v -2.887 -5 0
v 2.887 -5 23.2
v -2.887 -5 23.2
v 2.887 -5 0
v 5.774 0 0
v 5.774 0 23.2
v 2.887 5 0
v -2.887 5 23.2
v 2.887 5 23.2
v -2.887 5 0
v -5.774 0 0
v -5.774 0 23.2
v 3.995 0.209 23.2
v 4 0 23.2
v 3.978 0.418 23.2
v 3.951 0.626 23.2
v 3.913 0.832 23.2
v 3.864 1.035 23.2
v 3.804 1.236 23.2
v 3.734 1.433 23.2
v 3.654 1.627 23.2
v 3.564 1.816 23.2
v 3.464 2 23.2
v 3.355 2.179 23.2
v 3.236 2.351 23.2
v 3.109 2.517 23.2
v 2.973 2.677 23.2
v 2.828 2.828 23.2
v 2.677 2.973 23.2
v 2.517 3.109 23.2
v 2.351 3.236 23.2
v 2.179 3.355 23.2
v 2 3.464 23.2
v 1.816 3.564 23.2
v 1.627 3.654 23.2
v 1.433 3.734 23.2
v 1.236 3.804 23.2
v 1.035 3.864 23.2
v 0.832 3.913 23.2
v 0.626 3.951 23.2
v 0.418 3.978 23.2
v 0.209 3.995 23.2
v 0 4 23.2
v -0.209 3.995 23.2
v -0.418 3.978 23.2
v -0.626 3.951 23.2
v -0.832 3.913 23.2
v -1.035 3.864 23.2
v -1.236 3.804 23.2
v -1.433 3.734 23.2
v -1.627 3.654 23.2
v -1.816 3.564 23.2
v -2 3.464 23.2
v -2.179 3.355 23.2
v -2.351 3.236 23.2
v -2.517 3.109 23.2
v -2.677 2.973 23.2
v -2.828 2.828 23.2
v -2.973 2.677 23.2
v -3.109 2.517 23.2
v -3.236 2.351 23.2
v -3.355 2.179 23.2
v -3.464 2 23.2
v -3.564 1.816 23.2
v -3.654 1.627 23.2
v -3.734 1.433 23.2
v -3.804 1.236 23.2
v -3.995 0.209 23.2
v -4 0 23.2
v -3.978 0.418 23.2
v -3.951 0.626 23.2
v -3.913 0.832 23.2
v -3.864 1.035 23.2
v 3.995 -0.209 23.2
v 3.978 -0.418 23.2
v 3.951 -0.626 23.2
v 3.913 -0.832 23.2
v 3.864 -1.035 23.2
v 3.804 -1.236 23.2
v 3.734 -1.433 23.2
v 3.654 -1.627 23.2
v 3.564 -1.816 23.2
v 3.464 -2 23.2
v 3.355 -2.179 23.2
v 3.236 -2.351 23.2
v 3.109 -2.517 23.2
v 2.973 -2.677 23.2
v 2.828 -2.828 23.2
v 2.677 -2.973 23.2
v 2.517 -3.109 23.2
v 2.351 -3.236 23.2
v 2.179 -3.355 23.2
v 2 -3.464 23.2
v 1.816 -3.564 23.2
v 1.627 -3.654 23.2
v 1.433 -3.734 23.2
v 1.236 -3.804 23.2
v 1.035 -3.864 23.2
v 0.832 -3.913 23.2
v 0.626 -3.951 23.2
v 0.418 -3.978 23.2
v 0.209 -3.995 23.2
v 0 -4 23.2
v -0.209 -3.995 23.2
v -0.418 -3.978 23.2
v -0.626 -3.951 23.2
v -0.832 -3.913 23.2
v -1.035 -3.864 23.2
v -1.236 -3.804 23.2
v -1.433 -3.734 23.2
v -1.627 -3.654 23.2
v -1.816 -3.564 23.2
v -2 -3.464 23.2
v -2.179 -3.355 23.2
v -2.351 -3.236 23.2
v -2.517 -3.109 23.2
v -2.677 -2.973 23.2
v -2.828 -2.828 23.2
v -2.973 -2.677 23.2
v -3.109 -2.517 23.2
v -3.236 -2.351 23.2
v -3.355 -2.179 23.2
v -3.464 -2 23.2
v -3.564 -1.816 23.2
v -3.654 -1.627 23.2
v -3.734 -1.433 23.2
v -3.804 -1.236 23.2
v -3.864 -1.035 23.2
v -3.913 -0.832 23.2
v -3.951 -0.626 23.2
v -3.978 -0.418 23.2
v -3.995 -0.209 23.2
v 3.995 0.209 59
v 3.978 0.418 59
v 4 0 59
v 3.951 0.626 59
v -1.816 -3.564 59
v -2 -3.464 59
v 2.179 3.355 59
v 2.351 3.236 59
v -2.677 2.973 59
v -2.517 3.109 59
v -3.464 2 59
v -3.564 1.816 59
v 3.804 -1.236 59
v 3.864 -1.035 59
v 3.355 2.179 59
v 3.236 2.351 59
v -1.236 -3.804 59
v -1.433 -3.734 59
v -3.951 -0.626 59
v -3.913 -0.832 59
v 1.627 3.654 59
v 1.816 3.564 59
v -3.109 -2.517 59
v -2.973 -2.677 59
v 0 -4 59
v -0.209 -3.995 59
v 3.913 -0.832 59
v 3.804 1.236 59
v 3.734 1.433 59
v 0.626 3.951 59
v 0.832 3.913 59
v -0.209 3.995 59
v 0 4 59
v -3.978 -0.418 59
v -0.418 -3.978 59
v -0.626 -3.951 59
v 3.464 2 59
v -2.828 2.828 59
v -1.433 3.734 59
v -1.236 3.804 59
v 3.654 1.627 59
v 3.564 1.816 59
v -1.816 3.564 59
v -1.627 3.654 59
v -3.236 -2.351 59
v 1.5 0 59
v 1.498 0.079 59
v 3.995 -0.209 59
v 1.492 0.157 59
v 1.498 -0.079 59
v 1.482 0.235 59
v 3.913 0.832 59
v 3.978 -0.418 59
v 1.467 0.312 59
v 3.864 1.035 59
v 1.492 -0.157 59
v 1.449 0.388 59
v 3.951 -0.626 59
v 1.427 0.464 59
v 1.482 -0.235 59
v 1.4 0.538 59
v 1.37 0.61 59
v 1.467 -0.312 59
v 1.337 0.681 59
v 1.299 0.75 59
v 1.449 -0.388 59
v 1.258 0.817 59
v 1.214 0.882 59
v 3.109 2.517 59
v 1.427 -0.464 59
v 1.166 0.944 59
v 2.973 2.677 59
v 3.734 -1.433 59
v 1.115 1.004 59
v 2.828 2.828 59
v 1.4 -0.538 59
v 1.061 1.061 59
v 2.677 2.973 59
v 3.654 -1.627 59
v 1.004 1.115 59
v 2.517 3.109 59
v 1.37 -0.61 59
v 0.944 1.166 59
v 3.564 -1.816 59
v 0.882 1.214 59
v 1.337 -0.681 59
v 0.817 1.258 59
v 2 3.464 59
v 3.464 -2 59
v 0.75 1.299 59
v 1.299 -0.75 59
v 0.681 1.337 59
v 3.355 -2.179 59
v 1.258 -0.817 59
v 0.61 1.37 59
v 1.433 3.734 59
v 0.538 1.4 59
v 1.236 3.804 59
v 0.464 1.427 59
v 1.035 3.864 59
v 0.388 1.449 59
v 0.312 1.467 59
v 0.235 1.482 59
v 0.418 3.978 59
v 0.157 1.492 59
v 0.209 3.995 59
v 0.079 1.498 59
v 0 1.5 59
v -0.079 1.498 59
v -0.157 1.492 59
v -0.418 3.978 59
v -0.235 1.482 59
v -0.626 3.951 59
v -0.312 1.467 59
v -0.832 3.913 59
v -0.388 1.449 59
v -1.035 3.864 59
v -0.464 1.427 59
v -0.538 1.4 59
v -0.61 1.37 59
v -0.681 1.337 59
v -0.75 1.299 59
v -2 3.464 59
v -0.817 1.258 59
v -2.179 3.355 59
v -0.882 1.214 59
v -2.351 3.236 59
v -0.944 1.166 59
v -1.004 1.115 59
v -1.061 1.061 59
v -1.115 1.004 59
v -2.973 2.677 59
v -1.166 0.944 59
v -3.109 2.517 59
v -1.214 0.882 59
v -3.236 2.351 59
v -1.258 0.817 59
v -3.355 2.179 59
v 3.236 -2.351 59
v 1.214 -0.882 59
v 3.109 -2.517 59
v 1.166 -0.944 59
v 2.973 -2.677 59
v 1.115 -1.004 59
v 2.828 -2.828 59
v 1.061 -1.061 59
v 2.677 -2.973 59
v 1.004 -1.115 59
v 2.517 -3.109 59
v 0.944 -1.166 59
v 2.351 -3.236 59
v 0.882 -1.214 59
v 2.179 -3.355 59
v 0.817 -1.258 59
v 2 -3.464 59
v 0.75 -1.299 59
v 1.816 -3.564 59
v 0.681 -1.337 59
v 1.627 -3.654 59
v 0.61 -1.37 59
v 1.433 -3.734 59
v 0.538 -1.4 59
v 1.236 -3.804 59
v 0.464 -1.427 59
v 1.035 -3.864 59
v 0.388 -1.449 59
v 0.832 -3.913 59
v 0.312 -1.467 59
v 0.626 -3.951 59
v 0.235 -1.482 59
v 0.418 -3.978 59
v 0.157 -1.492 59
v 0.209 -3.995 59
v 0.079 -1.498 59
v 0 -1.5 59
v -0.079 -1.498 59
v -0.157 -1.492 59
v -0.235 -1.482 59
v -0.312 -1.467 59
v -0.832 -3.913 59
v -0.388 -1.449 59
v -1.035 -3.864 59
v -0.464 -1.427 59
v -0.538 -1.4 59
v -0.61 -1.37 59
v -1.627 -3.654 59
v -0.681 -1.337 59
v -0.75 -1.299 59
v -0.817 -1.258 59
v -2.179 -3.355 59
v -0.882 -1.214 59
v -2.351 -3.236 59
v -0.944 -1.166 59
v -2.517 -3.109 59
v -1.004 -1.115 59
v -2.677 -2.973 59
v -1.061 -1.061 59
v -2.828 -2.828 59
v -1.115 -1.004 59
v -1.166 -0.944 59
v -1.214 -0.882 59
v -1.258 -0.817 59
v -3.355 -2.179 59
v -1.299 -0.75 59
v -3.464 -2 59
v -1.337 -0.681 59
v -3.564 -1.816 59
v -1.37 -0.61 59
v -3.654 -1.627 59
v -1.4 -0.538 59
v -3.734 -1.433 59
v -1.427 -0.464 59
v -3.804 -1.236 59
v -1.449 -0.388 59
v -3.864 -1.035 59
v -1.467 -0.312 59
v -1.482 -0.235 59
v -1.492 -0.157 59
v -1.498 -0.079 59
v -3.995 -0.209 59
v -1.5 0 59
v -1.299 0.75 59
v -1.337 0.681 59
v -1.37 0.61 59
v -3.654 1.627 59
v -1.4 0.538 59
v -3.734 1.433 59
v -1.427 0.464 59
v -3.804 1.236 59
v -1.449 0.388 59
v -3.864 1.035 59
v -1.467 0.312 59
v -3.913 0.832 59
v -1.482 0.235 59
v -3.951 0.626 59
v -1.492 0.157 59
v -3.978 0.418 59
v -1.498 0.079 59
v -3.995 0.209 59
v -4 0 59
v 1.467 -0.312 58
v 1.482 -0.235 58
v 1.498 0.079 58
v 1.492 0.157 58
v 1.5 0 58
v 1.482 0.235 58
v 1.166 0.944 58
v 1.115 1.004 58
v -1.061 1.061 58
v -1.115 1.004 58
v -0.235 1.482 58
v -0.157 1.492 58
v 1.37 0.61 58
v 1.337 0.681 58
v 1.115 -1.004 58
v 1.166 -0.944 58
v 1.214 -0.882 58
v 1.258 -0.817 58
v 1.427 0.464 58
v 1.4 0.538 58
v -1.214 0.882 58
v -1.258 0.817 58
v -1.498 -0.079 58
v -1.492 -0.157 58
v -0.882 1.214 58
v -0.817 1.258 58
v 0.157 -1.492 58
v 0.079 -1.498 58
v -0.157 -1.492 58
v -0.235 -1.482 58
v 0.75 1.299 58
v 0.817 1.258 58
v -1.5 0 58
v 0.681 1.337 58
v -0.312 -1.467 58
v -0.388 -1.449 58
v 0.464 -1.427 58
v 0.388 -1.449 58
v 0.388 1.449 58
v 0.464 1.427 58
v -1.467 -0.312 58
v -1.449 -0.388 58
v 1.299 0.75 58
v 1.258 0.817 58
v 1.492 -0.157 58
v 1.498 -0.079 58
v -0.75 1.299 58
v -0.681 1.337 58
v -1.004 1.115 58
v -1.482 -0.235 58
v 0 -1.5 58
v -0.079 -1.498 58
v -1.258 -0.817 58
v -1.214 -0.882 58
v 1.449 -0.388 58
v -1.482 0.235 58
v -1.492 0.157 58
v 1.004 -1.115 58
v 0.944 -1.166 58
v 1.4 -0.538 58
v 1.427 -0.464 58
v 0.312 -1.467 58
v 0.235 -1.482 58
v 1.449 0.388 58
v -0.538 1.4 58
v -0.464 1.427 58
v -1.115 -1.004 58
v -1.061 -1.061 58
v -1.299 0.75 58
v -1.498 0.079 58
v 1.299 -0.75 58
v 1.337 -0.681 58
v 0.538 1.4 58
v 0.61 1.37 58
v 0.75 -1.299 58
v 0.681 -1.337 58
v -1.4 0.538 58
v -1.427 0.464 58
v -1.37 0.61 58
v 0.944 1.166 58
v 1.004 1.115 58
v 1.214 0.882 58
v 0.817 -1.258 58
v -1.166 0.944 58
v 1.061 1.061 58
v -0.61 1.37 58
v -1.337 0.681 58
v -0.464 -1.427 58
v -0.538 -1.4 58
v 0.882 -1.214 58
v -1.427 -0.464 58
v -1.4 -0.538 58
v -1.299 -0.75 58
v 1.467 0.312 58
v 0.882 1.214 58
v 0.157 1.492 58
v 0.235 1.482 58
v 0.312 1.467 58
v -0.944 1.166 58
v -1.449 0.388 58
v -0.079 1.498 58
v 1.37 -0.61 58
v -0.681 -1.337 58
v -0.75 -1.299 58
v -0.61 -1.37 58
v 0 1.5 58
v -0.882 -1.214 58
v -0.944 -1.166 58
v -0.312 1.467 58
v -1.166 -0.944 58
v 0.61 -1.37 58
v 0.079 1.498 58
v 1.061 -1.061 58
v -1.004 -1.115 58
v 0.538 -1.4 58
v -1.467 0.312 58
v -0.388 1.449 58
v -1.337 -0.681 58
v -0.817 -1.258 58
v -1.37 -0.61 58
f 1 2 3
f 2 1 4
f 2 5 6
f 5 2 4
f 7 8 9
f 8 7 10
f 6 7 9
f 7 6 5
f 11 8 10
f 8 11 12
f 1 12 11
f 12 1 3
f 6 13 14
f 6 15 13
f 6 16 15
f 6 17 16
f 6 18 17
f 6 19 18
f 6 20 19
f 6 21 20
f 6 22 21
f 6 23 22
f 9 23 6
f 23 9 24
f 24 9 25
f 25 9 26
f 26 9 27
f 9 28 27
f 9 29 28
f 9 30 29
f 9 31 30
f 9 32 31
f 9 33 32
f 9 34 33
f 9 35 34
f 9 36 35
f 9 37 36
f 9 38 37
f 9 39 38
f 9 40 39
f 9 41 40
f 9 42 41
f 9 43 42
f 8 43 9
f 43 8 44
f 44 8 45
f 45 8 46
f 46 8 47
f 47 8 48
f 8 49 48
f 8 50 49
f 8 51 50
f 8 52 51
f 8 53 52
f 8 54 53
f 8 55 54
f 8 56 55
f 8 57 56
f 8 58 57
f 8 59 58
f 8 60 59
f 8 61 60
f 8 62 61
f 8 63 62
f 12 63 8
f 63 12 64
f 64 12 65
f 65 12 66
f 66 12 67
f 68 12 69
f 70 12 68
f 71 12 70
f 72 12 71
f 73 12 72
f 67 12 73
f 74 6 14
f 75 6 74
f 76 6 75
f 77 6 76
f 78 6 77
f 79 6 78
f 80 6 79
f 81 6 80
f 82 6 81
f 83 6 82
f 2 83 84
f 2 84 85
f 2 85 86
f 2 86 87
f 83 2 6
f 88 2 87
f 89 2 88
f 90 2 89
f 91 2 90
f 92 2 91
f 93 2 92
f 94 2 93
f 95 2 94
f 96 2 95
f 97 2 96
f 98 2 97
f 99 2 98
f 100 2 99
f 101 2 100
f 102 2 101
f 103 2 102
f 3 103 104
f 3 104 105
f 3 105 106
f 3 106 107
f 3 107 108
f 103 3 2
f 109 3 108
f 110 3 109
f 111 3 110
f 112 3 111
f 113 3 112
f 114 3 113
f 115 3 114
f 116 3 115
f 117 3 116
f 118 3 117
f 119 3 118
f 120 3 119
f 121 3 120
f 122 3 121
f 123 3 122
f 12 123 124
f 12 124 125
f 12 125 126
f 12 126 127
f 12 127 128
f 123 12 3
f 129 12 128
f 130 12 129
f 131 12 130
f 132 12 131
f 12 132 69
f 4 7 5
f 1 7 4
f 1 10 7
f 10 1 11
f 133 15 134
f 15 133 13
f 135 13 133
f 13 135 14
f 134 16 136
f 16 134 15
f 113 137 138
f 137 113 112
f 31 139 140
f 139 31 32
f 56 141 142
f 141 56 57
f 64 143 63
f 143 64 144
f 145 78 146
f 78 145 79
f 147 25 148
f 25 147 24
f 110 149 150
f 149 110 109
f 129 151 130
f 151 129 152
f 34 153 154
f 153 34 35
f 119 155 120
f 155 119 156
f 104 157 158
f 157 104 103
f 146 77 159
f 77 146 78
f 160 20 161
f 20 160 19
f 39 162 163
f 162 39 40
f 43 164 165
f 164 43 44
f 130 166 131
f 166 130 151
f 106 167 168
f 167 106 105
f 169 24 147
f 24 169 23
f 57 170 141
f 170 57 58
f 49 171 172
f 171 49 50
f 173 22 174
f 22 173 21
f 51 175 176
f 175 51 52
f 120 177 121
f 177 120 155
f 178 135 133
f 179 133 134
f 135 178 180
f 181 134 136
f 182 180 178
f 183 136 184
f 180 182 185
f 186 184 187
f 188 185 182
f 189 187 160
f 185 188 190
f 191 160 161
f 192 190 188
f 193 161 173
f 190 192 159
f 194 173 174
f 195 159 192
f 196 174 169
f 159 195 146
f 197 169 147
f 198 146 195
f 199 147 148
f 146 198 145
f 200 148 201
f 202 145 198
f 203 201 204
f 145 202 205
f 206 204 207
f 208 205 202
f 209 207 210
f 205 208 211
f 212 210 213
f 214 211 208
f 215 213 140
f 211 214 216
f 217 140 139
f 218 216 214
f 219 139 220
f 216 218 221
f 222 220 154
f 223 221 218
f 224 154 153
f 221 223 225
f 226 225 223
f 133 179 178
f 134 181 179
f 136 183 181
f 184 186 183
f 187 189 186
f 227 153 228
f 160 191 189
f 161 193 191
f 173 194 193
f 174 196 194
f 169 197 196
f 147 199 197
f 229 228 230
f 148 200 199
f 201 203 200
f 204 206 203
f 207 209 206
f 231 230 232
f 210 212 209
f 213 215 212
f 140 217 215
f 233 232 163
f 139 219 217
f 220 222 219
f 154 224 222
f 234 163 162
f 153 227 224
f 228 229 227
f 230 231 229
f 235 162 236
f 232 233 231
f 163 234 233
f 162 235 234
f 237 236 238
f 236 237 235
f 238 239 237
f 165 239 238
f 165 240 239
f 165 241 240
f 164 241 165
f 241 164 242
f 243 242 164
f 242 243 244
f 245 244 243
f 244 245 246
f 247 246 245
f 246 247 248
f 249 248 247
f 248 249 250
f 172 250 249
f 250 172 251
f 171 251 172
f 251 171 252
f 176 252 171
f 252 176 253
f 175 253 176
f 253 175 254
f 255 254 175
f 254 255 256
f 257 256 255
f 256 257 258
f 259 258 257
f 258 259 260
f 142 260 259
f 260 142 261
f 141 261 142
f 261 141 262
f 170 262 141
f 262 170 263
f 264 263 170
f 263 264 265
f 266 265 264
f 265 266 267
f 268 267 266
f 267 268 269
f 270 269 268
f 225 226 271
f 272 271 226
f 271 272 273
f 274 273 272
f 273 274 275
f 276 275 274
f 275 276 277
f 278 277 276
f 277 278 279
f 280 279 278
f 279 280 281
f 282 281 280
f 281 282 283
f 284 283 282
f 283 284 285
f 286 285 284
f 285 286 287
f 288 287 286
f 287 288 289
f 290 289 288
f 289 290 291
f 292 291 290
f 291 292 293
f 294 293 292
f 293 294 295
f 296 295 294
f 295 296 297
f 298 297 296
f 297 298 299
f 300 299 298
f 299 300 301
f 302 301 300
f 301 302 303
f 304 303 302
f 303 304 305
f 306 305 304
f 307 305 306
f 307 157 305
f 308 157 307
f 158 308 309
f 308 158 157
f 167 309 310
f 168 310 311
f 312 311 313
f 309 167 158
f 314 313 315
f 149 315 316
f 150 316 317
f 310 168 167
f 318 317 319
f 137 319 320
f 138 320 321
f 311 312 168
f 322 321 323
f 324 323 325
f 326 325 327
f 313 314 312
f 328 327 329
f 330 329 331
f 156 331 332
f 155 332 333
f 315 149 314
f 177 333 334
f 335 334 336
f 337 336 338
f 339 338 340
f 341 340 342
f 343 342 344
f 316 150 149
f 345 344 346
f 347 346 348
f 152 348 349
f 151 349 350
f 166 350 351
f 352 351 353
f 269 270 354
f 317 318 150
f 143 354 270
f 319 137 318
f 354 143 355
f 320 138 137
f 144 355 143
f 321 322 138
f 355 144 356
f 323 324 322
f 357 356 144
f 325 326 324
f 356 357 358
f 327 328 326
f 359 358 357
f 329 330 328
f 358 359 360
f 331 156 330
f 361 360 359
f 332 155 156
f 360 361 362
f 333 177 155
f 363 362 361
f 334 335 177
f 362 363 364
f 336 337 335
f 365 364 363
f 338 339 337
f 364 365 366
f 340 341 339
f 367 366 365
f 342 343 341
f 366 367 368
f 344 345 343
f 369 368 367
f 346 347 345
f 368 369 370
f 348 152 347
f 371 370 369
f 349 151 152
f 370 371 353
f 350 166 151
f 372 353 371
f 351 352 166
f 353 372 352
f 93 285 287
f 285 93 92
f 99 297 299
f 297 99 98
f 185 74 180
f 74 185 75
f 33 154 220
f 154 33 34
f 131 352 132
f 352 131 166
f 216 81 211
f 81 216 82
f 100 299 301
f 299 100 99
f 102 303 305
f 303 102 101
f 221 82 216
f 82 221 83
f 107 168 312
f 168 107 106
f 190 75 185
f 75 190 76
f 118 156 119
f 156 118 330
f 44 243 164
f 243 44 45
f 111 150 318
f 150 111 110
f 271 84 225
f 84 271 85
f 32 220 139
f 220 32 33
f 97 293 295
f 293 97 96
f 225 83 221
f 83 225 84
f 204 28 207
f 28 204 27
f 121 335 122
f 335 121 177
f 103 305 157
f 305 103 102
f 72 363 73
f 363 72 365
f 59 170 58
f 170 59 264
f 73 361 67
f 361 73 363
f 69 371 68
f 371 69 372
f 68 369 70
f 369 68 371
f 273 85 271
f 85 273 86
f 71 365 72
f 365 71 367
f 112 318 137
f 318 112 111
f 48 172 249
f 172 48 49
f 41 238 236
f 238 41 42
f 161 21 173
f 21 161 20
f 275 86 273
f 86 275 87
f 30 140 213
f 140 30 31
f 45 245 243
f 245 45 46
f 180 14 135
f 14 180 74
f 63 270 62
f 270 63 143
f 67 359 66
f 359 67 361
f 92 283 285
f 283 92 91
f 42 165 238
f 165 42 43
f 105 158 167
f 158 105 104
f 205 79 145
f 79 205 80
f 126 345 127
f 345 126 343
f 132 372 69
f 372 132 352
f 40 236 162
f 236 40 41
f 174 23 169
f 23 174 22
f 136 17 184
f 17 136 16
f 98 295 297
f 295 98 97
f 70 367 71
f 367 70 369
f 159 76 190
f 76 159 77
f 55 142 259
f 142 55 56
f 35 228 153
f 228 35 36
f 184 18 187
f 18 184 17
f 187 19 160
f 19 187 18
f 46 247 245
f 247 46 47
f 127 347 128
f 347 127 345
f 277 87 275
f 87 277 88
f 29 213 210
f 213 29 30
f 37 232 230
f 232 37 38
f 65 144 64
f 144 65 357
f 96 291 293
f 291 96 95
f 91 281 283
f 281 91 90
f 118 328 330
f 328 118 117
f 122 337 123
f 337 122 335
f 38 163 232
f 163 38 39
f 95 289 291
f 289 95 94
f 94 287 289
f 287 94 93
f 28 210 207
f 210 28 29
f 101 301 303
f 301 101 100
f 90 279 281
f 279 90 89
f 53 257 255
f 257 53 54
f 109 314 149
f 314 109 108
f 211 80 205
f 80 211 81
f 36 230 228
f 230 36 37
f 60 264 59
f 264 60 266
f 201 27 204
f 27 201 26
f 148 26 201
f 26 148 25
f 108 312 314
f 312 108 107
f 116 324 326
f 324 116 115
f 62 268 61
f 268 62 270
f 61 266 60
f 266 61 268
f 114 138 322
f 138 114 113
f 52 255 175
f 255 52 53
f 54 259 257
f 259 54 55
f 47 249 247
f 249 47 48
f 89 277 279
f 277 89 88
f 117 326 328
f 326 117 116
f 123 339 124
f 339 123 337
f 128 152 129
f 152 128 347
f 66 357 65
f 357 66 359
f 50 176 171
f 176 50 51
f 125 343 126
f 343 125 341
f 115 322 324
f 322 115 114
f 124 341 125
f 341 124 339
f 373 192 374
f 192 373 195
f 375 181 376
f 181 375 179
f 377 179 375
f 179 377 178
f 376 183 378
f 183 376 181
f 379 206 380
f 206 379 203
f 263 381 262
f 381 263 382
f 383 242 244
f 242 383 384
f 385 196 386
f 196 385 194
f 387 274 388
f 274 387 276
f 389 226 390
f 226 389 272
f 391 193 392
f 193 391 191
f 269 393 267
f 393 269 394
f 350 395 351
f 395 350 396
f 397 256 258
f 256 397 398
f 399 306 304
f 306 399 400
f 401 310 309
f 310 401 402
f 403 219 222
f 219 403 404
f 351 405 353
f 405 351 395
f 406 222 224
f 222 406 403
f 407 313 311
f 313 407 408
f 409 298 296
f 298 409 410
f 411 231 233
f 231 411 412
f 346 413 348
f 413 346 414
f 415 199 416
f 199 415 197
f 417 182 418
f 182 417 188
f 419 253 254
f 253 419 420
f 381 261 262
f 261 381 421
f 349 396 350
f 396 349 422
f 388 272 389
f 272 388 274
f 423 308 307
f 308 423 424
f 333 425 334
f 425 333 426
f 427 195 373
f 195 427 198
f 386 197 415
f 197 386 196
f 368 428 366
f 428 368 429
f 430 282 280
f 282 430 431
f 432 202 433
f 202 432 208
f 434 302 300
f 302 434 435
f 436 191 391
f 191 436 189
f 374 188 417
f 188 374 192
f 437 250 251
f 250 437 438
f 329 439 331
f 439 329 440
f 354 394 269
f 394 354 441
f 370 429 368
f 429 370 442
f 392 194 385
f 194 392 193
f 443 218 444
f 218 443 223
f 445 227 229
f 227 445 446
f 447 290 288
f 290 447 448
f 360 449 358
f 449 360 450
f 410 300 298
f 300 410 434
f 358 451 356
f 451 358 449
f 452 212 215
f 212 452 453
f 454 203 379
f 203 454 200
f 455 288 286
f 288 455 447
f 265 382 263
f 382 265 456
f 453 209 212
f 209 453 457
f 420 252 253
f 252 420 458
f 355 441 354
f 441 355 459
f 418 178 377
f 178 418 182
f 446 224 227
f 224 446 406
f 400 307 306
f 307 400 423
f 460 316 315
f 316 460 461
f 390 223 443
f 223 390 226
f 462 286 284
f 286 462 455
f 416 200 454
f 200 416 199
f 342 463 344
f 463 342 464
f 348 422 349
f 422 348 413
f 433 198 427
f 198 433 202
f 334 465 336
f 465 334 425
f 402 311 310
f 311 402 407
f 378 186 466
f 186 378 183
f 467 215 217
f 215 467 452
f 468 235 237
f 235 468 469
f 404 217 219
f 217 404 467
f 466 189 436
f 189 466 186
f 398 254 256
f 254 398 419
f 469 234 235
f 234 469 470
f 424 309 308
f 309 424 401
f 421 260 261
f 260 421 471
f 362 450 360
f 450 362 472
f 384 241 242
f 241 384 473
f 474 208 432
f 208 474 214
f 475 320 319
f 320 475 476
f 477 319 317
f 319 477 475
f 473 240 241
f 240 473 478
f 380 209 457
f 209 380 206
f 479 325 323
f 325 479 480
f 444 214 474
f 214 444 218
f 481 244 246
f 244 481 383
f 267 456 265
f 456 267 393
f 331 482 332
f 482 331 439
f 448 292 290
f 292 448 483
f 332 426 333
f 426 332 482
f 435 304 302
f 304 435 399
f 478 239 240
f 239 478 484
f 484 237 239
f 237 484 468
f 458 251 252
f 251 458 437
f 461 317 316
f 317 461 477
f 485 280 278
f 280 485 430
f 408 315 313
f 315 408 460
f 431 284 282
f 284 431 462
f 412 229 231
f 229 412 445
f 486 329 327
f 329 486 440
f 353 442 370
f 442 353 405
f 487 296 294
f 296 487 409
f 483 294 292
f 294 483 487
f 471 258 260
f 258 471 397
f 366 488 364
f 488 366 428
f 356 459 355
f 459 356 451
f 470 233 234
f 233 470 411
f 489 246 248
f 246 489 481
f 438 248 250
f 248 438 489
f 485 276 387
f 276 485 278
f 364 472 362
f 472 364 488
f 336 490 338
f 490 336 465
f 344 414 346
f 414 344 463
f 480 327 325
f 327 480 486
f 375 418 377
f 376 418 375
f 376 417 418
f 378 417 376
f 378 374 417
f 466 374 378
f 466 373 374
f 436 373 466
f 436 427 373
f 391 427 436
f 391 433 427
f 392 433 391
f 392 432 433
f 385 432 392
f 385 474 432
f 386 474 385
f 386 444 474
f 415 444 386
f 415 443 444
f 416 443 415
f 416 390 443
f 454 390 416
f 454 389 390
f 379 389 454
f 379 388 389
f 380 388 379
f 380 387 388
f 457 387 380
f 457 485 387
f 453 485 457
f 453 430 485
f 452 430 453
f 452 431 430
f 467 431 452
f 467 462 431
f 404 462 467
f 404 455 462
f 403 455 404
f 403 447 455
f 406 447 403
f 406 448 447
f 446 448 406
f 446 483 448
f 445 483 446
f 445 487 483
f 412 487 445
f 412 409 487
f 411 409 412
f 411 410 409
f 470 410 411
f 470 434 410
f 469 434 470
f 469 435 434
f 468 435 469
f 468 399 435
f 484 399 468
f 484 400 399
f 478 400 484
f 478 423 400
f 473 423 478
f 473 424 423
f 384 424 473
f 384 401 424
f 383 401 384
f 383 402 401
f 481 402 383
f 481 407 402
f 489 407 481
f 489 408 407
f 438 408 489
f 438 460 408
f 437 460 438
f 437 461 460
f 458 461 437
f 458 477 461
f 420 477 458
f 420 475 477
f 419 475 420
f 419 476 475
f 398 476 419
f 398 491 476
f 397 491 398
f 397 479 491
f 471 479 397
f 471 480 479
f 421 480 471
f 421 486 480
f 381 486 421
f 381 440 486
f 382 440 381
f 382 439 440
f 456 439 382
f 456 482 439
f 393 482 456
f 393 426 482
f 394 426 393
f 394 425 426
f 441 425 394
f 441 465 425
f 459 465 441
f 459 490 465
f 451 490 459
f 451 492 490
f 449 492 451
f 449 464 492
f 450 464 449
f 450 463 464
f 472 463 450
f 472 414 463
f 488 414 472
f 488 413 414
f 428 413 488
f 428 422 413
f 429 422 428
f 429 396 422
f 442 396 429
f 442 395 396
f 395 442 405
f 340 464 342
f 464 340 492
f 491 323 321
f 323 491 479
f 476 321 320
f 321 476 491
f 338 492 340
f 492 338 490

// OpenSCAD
// file: ../../lib/hex_shaft.scad
// ==========================================================================
//  Turtle Body -- round / hex centre axle  (lib module)
// --------------------------------------------------------------------------
//  Round section bears in the cap; hex section drives the cage and passes
//  through the sail bar. Magnet recess opens at the round end for an AS5600
//  sensing magnet. See CLAUDE.md s9.
//
//  TB-04: derived to the resolved 5 mm cap roof (TB-03). The round section
//  spans `round_inside_cap` (roof underside -> round end, 30 mm, INCLUDING
//  the boss -- do not add the boss again) + the 5 mm roof + 1 mm proud, so
//  the round end still sits 1 mm above the cap's outer face and the overall
//  axle is 59 mm (was 58 mm at the stale 4 mm roof).
//
//  Definitions only. Geometry is emitted by control_axle().
// ==========================================================================

use <params.scad>

module control_axle(round_d        = p_axle_round_d(),
                    round_inside_cap = p_axle_round_inside_cap(),  // 30, roof underside -> round end
                    round_ext      = p_axle_round_ext(),           // 1, proud of the cap face
                    cap_roof_t     = p_cap_roof_t(),               // 5 (TB-03)
                    hex_af         = p_axle_hex_af(),
                    hex_len        = p_axle_hex_len(),
                    join_overlap   = p_axle_join_overlap(),
                    magnet         = true,
                    magnet_d       = p_magnet_d(),
                    magnet_t       = p_magnet_t(),
                    fn             = undef) {
    nn        = fn == undef ? p_fn_plastic() : fn;
    hex_cd    = hex_af / cos(30);
    round_len = round_inside_cap + cap_roof_t + round_ext;
    total_len = hex_len + round_len;

    // ---- interface asserts (inputs from the shared contract) ----
    assert(round_d > 0 && round_d < p_cap_axle_bore_d(),
           "control_axle: round shaft must clear the cap bore.");
    assert(hex_af > round_d && hex_af < p_cage_hex_bore_af(),
           "control_axle: hex across-flats must sit between round dia and cage bore.");
    assert(hex_cd < p_sail_bar_axle_hole_d(),
           "control_axle: hex corners must fit the sail-bar axle hole.");
    assert(join_overlap > 0 && join_overlap < min(hex_len, round_len));
    assert(round_inside_cap > 0 && cap_roof_t > 0 && round_ext >= 0);
    assert(round_inside_cap > p_cap_boss_depth(),
           "control_axle: round section must pass the boss.");
    assert(round_inside_cap < p_cap_insert_len(),
           "control_axle: keep the round end inside the cap's open insert rim.");
    assert(hex_len + round_ext >
           p_cage_bearing_d() / 2 + p_cage_roof_t() + p_top_crossbar_t(),
           "control_axle: axle must reach through the cage roof and sail bar.");
    assert(!magnet || (magnet_d > 0 && magnet_d < round_d
           && magnet_t > 0 && magnet_t < round_inside_cap));

    $fn = nn;
    difference() {
        union() {
            cylinder(d = hex_cd, h = hex_len + join_overlap, $fn = 6);
            translate([0, 0, hex_len - join_overlap])
                cylinder(d = round_d, h = round_len + join_overlap);
        }
        if (magnet)
            translate([0, 0, total_len - magnet_t])
                cylinder(d = magnet_d, h = magnet_t + p_eps());
    }

    echo("AXLE: total / round / hex length = ", total_len, round_len, hex_len);
    echo("AXLE: round dia / hex across flats / hex corners = ", round_d, hex_af, hex_cd);
}

// Print pose: hex end already on Z=0, magnet opening up -- this is the
// as-modelled orientation, so no reseat module is needed.
// main file
/*
 Hope Turtle — round/hex centre axle. Units: mm. License: CERN-OHL-S-2.0.
 Hex end on Z=0 for printing; the magnet recess opens upward.
 Round section = 30 mm inside the cavity (incl. boss) + 5 mm cap roof (TB-03)
 + 1 mm proud. Overall length 59 mm.

 SOURCE FILE — geometry lives in lib/hex_shaft.scad + lib/params.scad.
 The committed self-contained file is generated by build/build.py.
*/

/* [Round shaft] */
round_shaft_diameter = 8;
round_length_inside_cap = 30; // roof underside -> round end, INCLUDING the boss
round_extension_above_cap = 1;

/* [Hex shaft] */
hex_across_flats = 10;
hex_length = 23;
joining_overlap = 0.2;

/* [Magnet recess] */
magnet_recess_enabled = true;
magnet_diameter = 3;
magnet_thickness = 1;

/* [Render] */
fn = 120; // [48:8:240]

use <../../lib/hex_shaft.scad>

color([0.74, 0.77, 0.79])
control_axle(round_d          = round_shaft_diameter,
             round_inside_cap = round_length_inside_cap,
             round_ext        = round_extension_above_cap,
             hex_af           = hex_across_flats,
             hex_len          = hex_length,
             join_overlap     = joining_overlap,
             magnet           = magnet_recess_enabled,
             magnet_d         = magnet_diameter,
             magnet_t         = magnet_thickness,
             fn               = fn);
